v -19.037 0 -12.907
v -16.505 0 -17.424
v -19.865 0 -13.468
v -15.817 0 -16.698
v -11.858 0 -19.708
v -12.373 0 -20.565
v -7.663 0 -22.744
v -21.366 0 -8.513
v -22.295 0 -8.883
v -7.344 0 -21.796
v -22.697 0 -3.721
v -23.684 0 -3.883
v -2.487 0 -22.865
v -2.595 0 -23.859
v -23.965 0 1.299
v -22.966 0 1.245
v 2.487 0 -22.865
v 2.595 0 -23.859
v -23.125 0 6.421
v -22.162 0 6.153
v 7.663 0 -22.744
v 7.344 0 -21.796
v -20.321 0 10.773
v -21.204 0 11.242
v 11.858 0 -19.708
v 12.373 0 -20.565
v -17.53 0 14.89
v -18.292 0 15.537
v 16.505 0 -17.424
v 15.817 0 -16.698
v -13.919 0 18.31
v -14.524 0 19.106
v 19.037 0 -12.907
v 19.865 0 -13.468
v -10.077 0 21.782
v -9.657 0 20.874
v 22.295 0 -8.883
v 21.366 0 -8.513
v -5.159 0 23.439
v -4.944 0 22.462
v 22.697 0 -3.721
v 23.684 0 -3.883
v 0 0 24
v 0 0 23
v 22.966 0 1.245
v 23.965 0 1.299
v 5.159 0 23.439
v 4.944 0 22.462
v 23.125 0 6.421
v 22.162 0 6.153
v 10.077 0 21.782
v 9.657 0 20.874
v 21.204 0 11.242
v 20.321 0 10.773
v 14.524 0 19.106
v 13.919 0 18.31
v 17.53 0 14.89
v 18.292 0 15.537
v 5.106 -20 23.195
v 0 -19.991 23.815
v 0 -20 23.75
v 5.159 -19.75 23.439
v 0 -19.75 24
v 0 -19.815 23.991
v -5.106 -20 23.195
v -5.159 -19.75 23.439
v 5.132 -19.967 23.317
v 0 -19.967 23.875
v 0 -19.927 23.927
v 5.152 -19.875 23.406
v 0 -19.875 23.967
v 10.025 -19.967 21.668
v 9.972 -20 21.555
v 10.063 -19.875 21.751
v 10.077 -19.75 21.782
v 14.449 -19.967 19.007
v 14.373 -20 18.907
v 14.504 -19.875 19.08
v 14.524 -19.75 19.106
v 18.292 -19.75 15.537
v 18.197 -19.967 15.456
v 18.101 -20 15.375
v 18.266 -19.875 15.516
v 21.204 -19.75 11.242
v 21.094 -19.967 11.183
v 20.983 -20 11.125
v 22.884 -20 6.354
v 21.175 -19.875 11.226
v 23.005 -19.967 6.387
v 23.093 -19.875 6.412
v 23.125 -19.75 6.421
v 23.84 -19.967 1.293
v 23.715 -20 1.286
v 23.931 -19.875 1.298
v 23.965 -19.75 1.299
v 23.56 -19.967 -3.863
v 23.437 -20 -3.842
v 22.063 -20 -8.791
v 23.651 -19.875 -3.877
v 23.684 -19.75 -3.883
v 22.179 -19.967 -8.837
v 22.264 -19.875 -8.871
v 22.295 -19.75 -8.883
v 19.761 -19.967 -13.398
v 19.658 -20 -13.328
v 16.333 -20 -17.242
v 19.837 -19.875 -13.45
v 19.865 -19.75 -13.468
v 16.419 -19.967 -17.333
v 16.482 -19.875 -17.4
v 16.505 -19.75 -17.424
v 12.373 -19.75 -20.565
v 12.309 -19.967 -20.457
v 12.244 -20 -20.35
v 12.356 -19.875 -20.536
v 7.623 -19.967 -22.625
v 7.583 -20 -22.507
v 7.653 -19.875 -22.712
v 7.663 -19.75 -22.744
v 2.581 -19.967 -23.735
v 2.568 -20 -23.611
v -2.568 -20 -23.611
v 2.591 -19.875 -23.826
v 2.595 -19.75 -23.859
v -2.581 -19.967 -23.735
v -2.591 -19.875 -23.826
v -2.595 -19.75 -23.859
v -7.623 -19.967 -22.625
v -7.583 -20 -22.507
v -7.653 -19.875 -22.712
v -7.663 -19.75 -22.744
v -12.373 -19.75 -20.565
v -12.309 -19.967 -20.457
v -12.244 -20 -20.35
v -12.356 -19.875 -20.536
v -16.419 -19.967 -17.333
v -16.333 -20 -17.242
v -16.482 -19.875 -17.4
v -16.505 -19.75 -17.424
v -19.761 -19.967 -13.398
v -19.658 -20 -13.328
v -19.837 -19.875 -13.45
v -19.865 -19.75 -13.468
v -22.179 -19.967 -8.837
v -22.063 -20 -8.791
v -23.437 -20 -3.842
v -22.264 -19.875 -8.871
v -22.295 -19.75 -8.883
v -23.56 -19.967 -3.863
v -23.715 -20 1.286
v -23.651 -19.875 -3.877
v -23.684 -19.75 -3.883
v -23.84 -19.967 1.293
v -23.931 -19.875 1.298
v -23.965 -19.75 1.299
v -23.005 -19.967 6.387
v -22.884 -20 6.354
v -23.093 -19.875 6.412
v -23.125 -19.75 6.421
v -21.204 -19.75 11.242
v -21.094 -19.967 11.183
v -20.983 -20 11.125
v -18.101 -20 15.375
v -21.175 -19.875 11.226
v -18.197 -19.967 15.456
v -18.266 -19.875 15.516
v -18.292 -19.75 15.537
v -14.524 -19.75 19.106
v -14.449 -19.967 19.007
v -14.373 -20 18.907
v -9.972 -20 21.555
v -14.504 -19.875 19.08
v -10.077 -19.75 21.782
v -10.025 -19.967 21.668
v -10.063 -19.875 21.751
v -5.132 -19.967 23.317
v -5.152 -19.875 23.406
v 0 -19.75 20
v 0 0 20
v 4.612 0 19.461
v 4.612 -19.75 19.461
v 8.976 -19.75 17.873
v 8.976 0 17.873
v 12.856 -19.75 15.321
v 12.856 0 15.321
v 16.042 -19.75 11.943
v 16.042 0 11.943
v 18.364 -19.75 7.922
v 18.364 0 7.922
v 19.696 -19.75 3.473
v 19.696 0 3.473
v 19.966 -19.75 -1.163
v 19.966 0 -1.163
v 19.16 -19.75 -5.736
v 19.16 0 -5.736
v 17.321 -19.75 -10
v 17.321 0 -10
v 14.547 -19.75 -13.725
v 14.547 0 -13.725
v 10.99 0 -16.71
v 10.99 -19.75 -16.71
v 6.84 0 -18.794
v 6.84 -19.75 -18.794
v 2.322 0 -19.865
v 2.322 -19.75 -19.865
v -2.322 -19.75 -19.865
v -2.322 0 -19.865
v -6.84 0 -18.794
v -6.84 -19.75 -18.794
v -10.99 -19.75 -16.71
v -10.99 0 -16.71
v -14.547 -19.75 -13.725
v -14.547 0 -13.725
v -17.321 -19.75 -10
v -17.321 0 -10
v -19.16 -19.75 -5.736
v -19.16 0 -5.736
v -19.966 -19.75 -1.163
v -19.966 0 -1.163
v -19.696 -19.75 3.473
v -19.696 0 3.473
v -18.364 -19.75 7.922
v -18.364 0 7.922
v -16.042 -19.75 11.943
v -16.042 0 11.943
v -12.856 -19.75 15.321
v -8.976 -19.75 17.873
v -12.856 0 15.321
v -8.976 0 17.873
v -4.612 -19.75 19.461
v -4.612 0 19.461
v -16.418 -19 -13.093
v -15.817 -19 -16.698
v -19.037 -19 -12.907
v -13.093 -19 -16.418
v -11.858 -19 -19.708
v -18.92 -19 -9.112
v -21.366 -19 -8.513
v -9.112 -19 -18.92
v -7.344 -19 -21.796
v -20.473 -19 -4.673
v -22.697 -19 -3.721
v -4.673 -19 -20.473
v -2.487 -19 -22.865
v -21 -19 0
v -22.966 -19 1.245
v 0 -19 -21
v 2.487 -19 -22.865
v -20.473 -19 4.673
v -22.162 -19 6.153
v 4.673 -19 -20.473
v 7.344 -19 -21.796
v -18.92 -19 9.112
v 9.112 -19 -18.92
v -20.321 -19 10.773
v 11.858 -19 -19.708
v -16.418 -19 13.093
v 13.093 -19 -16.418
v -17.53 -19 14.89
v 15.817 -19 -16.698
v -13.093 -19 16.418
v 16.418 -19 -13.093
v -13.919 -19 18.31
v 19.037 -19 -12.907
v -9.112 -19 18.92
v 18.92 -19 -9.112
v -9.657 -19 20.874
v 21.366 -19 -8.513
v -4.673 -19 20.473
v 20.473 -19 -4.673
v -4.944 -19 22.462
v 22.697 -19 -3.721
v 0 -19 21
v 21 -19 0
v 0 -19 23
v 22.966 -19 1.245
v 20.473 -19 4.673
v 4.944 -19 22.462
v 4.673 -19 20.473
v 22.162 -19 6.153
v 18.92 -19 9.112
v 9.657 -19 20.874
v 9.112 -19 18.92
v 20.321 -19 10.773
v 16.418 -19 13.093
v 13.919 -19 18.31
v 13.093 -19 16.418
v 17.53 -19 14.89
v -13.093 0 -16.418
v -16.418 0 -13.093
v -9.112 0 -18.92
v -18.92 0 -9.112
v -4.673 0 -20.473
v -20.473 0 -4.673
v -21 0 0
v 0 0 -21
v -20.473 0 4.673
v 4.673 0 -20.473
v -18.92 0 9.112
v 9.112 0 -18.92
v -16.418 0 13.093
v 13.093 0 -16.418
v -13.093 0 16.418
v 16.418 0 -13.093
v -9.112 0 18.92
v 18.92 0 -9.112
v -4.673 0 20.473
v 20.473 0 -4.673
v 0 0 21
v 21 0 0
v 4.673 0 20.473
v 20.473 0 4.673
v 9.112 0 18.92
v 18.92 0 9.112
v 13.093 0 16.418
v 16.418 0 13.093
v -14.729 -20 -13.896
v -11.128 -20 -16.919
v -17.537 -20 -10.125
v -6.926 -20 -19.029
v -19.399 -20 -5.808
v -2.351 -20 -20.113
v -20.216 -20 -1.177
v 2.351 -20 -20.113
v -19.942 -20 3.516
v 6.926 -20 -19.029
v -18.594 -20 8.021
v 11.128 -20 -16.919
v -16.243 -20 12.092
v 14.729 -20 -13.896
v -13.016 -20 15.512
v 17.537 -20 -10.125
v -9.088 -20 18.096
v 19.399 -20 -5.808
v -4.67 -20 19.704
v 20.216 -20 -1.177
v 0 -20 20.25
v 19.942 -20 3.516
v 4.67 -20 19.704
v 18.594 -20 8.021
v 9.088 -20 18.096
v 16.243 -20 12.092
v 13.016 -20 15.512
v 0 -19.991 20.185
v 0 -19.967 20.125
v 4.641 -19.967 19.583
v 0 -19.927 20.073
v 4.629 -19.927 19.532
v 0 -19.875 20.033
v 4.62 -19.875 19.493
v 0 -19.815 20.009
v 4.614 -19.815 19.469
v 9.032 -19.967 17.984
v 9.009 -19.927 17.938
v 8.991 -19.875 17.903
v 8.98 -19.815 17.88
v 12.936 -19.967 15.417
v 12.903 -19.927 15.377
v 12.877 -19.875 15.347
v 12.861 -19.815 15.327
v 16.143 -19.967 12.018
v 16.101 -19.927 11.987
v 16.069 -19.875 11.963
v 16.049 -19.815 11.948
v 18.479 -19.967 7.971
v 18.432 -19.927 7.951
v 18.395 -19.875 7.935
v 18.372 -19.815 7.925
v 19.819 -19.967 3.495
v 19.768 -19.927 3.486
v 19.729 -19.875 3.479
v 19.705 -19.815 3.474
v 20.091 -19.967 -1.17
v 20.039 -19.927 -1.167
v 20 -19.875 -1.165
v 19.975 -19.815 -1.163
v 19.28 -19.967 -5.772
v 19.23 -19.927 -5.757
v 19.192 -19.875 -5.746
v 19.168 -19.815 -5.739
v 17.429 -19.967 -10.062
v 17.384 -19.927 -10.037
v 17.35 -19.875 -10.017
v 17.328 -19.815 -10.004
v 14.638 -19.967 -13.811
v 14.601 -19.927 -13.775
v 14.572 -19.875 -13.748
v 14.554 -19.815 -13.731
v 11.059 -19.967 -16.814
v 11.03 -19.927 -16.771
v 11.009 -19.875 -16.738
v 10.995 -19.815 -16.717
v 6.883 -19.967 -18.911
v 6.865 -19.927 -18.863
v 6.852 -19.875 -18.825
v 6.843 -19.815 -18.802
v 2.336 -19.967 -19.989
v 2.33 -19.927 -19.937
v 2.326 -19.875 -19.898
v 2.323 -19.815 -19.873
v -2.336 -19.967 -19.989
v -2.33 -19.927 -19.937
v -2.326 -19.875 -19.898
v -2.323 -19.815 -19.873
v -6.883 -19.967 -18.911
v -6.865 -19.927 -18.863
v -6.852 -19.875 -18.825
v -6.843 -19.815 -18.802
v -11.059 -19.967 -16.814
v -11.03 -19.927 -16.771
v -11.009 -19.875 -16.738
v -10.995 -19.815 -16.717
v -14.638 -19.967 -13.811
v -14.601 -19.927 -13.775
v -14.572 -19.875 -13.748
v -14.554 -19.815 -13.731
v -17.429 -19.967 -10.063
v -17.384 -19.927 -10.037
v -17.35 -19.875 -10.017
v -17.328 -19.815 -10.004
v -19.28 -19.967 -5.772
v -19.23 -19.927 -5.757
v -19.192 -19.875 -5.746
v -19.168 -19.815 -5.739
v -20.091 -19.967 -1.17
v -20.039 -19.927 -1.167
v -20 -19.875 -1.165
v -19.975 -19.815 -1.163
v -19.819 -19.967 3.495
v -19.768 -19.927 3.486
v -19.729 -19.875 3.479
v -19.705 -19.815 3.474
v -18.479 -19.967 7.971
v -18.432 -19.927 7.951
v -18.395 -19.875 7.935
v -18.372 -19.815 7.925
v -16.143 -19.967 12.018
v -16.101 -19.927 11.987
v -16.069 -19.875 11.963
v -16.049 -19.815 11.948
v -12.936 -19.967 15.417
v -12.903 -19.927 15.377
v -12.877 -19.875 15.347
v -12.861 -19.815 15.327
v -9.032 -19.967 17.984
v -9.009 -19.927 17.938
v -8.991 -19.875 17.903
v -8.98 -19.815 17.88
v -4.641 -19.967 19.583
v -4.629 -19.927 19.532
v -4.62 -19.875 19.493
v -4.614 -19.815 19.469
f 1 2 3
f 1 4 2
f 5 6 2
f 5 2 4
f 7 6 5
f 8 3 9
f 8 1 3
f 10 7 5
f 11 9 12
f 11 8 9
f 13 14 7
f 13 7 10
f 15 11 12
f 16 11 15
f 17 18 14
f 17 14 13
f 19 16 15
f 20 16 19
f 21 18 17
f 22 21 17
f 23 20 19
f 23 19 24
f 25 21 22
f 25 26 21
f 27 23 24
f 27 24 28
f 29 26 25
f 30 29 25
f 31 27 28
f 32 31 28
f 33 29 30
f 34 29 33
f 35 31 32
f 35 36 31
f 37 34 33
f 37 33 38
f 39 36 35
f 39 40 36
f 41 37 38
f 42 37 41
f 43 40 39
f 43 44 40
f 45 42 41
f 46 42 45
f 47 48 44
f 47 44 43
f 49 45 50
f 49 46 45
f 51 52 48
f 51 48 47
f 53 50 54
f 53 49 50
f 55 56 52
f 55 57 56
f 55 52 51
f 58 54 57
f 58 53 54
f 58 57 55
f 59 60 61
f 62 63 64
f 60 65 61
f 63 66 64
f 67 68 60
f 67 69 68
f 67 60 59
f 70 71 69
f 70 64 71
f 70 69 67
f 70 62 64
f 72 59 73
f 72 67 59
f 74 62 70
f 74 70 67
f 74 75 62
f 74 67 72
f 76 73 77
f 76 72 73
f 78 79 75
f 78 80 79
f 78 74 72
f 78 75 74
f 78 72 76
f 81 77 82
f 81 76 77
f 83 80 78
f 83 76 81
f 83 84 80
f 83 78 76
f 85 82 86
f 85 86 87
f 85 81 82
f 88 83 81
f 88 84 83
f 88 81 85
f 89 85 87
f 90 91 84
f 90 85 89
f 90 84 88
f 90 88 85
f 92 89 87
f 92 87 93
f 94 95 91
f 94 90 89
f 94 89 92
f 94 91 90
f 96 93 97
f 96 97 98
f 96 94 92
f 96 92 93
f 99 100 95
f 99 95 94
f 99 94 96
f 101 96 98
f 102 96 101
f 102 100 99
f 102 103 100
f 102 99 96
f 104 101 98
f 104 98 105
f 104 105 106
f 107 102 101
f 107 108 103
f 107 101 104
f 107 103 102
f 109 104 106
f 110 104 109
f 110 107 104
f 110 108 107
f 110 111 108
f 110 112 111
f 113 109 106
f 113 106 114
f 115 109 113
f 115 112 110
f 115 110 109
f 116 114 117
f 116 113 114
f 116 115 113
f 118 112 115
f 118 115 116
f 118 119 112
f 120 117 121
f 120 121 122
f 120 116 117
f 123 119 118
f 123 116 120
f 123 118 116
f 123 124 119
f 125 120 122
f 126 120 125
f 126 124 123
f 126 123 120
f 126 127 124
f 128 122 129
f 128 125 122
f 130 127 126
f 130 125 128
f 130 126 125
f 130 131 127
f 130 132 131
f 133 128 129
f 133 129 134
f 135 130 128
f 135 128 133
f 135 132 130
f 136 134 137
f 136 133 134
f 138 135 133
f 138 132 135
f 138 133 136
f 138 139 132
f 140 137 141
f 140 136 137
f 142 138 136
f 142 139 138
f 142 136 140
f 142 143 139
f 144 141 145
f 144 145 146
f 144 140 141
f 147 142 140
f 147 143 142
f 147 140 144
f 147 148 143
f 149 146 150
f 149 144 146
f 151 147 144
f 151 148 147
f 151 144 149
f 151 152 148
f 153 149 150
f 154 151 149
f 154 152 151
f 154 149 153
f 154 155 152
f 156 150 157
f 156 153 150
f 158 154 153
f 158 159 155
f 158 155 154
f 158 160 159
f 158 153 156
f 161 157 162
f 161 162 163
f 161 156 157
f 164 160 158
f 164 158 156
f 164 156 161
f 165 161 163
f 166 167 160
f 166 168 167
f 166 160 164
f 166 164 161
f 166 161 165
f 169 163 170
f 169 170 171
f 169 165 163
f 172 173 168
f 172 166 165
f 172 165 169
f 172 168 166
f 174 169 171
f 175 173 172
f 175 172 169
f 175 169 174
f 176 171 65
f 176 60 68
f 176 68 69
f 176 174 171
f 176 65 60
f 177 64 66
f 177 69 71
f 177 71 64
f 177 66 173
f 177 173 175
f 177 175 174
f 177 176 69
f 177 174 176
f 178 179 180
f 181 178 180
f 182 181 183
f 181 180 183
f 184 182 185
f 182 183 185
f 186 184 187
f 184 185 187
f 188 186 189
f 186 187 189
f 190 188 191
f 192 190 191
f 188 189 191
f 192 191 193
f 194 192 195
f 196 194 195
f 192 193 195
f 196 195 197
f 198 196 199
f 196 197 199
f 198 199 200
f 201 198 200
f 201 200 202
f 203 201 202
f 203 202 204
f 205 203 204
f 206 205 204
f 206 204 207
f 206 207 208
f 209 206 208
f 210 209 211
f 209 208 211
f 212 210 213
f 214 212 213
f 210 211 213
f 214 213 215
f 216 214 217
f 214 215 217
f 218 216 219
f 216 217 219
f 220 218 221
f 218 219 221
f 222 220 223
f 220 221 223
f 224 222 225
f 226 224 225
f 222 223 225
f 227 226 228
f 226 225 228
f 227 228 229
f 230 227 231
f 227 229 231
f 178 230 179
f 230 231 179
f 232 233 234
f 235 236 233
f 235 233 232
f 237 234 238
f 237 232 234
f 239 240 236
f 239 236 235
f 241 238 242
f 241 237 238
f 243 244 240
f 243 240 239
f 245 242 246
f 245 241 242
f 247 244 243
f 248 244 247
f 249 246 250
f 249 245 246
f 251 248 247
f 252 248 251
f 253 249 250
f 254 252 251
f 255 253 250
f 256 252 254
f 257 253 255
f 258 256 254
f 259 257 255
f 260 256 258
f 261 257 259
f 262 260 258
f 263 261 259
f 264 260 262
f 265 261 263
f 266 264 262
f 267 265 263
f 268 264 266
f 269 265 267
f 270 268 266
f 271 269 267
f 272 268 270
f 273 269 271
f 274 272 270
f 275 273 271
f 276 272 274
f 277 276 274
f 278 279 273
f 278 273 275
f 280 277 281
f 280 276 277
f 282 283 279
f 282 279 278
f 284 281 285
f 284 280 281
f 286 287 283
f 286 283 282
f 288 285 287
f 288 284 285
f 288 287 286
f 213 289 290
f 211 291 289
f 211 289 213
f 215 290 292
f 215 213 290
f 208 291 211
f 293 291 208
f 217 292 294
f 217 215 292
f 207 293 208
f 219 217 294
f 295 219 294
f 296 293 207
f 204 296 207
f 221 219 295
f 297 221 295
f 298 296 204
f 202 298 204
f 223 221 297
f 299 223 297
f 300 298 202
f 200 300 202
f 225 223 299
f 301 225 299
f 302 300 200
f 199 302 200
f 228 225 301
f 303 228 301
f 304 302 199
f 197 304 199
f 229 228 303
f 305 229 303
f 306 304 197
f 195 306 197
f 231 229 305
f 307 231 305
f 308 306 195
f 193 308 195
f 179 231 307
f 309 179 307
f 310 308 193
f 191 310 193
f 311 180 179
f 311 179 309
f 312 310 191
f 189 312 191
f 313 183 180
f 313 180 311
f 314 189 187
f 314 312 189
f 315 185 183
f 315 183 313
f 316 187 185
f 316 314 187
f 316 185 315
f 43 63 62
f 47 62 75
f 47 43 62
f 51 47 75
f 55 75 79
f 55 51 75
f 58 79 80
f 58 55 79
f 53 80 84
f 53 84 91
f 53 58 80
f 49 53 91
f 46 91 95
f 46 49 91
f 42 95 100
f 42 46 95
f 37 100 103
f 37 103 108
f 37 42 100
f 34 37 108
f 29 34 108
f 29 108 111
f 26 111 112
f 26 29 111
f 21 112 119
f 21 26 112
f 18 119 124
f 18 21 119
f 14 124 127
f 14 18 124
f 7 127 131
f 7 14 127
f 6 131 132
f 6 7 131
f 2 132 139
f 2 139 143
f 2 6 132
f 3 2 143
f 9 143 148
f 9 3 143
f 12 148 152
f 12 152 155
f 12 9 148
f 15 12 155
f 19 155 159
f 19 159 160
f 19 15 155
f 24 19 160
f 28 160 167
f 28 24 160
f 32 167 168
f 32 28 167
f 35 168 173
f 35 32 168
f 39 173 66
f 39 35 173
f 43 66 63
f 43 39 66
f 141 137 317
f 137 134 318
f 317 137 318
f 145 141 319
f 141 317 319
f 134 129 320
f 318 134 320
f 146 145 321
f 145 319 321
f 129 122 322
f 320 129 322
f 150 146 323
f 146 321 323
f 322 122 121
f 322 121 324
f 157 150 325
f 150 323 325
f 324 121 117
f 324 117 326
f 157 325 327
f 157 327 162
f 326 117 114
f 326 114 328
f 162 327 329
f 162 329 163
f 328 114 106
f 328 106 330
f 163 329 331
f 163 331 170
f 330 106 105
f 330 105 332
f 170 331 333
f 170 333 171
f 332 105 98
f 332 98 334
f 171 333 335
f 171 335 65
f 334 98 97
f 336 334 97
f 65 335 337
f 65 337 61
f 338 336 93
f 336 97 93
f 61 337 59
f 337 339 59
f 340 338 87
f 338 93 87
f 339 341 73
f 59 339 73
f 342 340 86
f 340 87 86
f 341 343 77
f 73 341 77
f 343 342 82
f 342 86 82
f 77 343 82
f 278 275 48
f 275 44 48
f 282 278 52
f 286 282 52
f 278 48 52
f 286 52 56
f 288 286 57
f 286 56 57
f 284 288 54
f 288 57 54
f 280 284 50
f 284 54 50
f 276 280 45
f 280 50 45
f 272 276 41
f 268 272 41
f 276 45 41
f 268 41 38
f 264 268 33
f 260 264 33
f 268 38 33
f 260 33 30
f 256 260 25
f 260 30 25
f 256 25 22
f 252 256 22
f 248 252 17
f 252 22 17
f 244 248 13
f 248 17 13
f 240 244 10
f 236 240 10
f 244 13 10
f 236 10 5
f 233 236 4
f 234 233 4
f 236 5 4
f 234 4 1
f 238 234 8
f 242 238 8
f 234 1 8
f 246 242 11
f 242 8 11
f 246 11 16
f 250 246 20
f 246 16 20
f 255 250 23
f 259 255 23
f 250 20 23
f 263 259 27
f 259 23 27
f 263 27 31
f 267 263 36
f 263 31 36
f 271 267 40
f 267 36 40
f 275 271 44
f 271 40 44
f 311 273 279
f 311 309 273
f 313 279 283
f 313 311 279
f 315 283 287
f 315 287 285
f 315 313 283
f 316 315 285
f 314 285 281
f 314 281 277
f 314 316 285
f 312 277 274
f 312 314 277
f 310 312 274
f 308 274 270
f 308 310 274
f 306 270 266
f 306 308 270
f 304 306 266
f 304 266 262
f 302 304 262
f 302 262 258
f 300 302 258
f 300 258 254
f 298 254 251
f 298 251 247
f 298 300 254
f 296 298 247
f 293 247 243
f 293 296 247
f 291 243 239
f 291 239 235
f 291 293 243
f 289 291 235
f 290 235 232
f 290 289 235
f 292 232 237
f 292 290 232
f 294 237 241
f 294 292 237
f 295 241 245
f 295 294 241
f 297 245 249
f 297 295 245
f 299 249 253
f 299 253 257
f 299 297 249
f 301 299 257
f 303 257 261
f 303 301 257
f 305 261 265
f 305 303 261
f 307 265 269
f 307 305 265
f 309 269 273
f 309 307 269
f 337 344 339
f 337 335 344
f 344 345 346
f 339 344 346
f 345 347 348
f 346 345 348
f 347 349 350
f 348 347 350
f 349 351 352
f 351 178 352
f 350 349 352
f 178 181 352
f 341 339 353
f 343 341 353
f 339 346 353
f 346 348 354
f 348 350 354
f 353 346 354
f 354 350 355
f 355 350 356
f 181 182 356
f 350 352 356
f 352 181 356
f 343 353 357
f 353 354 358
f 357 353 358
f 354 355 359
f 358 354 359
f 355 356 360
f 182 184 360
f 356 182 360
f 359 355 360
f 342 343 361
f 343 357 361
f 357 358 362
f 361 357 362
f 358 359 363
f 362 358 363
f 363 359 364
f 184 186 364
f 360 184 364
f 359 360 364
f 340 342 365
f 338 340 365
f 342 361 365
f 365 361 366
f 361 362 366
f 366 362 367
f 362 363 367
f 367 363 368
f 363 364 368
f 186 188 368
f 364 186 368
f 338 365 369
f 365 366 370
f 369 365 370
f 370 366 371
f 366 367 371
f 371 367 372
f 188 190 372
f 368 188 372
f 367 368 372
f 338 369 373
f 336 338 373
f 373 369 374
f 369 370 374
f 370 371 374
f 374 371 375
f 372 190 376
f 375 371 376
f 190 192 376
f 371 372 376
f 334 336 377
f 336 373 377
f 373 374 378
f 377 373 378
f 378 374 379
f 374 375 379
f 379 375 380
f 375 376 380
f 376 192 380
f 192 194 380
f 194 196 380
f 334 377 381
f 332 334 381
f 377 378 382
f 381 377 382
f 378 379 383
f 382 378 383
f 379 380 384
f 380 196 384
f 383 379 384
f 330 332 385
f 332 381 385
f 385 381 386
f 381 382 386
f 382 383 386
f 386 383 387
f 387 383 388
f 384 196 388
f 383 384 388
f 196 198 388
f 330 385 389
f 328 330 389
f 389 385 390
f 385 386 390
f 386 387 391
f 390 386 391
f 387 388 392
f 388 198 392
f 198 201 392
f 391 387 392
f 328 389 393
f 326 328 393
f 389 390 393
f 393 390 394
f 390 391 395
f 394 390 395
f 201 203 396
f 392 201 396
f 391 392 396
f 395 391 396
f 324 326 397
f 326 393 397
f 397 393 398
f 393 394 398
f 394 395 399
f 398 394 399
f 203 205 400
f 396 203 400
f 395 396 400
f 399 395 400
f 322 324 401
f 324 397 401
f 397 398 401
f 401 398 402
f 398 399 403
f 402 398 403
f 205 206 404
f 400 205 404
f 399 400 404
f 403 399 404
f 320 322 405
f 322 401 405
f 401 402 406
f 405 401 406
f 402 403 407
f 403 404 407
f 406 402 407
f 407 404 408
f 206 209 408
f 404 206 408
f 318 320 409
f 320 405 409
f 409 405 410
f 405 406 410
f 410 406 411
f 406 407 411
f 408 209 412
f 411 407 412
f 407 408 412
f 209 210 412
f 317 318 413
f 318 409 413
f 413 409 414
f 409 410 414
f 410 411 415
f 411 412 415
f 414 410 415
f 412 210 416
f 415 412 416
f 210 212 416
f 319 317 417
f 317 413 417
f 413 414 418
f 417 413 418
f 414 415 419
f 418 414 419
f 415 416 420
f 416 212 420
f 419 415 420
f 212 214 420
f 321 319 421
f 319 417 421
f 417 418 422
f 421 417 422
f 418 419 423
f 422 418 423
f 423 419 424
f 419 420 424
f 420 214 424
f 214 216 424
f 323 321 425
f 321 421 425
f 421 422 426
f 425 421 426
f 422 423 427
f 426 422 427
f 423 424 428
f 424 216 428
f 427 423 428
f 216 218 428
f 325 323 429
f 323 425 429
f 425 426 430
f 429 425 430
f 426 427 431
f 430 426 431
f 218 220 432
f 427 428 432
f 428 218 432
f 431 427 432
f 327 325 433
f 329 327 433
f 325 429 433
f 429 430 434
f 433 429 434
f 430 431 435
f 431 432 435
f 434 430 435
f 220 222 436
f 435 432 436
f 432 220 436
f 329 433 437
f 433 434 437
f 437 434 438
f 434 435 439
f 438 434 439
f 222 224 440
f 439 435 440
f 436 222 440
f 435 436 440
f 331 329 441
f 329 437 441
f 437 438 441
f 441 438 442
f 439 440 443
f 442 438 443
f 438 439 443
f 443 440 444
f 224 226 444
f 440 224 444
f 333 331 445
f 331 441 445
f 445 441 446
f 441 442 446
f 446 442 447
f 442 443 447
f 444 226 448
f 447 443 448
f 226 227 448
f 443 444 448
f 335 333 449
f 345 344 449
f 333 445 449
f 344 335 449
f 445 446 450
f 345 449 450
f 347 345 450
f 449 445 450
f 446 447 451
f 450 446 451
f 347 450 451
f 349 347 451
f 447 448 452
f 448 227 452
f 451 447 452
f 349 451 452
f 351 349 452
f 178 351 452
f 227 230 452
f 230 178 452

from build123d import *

# Parameters (mm, degrees)
SKETCH1_R           = 24
SKETCH1_R_2         = 20
BOSS_EXTRUDE1_DEPTH = 20
SHELL4_T            = -1
FILLET1_R           = 0.25
FILLET2_R           = 0.25


with BuildPart() as part:
    # Sketch1 → Boss-Extrude1 (new body)
    with BuildSketch(Plane(origin=(0, 0, 0), x_dir=(1, 0, 0), z_dir=(0, 1, 0))):
        with Locations(Location((0, 0, 0), (0, 0, 270))):
            Circle(SKETCH1_R)
        with Locations(Location((0, 0, 0), (0, 0, 270))):
            Circle(SKETCH1_R_2, mode=Mode.SUBTRACT)
    extrude(amount=-BOSS_EXTRUDE1_DEPTH)

    # Shell4
    shell4_openings = [part.faces().sort_by_distance(p)[0] for p in [
        (0, 0, -23.32117749),
    ]]
    offset(amount=SHELL4_T, openings=shell4_openings, kind=Kind.INTERSECTION)

    # Fillet1
    fillet1_edges = [part.edges().sort_by_distance(p)[0] for p in [
        (0, -20, -20),
    ]]
    fillet(fillet1_edges, radius=FILLET1_R)

    # Fillet2
    fillet2_edges = [part.edges().sort_by_distance(p)[0] for p in [
        (0, -20, -24),
    ]]
    fillet(fillet2_edges, radius=FILLET2_R)


solid = part.part
